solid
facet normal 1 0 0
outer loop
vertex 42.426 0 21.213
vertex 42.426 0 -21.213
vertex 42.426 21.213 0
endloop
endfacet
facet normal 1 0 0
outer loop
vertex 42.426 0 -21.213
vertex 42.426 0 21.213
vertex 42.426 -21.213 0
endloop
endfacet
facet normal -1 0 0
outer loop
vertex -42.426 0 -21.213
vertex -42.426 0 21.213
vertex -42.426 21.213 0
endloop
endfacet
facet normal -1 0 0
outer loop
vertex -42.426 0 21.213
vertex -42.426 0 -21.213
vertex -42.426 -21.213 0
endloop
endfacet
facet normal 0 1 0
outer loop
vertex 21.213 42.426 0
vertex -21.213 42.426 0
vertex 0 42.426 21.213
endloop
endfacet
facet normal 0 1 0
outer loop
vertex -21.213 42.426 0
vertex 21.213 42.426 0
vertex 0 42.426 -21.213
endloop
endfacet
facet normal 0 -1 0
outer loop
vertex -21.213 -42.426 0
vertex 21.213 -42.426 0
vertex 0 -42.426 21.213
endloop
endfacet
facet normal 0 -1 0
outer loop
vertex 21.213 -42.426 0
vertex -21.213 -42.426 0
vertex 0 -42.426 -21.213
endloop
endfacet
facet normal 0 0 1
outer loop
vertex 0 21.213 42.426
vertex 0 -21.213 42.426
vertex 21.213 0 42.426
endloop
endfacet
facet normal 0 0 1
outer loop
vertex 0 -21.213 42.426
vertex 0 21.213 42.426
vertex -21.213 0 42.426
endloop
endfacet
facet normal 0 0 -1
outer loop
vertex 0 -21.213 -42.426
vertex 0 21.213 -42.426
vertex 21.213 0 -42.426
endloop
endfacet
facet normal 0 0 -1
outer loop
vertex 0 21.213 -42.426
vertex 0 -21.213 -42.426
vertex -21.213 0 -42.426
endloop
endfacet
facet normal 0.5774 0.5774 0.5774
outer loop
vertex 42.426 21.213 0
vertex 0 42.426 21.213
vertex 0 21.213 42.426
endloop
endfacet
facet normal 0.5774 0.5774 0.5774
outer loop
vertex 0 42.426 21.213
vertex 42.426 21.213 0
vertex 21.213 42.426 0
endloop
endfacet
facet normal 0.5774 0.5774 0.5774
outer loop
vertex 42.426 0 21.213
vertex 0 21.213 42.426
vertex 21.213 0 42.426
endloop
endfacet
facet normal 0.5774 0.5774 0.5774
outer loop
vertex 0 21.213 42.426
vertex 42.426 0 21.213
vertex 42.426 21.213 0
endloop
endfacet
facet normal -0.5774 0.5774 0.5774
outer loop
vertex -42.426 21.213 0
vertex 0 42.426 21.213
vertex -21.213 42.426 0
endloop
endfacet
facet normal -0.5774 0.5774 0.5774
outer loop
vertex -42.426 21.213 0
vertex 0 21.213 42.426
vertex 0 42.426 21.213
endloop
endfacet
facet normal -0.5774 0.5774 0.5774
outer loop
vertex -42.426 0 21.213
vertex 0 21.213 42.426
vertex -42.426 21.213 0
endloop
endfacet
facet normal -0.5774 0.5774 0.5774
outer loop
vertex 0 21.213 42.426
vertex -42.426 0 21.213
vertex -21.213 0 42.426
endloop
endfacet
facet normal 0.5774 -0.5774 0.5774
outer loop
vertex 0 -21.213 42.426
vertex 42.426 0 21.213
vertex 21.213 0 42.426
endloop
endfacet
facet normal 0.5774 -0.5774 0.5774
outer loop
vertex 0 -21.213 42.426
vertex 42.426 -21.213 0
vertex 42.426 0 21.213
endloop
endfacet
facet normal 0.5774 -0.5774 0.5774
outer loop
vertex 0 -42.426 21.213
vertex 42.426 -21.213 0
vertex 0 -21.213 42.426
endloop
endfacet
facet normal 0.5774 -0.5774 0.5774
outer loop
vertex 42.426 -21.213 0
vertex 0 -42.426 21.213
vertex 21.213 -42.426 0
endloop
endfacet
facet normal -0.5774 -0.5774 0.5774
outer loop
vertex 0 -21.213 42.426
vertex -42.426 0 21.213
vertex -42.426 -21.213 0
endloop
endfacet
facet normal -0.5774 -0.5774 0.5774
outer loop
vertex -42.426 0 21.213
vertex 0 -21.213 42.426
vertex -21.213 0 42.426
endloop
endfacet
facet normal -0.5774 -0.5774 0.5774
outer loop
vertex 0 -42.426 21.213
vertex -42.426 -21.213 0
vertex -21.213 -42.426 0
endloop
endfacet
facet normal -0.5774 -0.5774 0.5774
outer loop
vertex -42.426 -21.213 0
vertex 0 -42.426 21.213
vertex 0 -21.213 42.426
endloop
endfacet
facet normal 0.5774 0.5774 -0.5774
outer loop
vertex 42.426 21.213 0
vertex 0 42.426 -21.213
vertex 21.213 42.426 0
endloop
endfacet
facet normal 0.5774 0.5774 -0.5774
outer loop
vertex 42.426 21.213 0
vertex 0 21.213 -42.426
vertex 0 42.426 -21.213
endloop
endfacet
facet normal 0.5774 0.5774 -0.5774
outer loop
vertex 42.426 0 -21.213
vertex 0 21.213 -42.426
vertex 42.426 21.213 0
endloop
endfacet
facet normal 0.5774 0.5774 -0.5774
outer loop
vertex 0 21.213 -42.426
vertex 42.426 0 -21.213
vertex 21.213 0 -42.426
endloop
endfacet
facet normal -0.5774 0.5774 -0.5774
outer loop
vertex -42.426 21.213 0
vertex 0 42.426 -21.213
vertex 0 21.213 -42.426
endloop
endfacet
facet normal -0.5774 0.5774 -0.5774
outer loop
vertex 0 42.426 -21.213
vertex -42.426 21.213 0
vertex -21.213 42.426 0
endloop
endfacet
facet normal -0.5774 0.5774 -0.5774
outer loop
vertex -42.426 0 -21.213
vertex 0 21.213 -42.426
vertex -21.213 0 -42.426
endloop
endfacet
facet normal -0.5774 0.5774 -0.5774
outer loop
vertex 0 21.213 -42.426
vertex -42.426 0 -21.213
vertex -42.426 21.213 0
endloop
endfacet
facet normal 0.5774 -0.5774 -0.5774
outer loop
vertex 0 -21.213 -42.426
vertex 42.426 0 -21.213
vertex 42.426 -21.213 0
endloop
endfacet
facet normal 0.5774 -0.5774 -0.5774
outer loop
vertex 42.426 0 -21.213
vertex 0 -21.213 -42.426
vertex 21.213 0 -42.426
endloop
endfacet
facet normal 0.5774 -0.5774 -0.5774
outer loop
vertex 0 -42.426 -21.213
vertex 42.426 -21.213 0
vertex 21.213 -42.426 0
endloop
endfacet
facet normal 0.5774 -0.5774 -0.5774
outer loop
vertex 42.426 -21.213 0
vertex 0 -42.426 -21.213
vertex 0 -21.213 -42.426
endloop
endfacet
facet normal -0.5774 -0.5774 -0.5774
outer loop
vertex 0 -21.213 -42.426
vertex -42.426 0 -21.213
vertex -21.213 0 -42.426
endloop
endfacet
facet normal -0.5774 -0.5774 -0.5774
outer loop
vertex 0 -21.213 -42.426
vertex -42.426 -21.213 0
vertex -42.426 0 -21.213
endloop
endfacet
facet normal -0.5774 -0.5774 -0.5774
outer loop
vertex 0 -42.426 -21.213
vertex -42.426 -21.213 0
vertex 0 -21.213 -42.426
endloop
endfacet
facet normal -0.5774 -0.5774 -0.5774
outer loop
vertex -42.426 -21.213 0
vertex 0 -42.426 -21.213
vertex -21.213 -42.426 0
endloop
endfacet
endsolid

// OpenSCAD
// Truncated Octahedron
// (C) @oblomobka - 2023.06
// GPL license

/* **CUSTOMIZER VARIABLES** */
// Edge
edge = 30; // [10:100]
// Center of the solid or stand over a face
position = "Center"; // ["Center", "Face"]

/* **MODULES** */   
module TruncatedOctahedron ( edge = 30, position = "Face"){ //tO / bT -> Conway notation
    
    // Invariants
    
    // Relations
    
    // Variables
    a = 3*edge/sqrt(2);
    b = edge/sqrt(2); //b represent the truncation value to obtain regular polygons. It operates on the vertex of the original(Platonic) polyhedron.
    
    // Definition of points and faces V = 24 / F = 14 ( 6 squares + 8 hexagons )
    tOpoints = [
        // Every line build the vertices of a square, tha is the truncation on the octahedron vertices
        [ +(a-b), +b, 0], [ +(a-b), -b, 0], [ +(a-b), 0, +b], [ +(a-b), 0, -b], // +X   [  0,  1,  2,  3]
        [ +b, +(a-b), 0], [ -b, +(a-b), 0], [ 0, +(a-b), +b], [ 0, +(a-b), -b], // +Y   [  4,  5,  6,  7]
        [ +b, 0, +(a-b)], [ -b, 0, +(a-b)], [ 0, +b, +(a-b)], [ 0, -b, +(a-b)], // +Z   [  8,  9, 10, 11]
        [ -(a-b), +b, 0], [ -(a-b), -b, 0], [ -(a-b), 0, +b], [ -(a-b), 0, -b], // -X   [ 12, 13, 14, 15]
        [ +b, -(a-b), 0], [ -b, -(a-b), 0], [ 0, -(a-b), +b], [ 0, -(a-b), -b], // -Y   [ 16, 17, 18, 18]
        [ +b, 0, -(a-b)], [ -b, 0, -(a-b)], [ 0, +b, -(a-b)], [ 0, -b, -(a-b)]  // -Z   [ 20, 21, 22, 23]
        ];
    
    tOfaces = [
        // Squares
        [  0,  3,  1,  2], [ 12, 14, 13, 15],                   // parallel YZ
        [  4,  6,  5,  7], [ 16, 19, 17, 18],                   // parallel XZ
        [  8, 11,  9, 10], [ 21, 23, 20, 22],                   // parallel XY
        // Build 8 hexagons. One hexagon per octant
        [  0,  2,  8, 10,  6,  4], [  5,  6, 10,  9, 14, 12],   // UP
        [  1, 16, 18, 11,  8,  2], [  9, 11, 18, 17, 13, 14],   // UP
        [  0,  4,  7, 22, 20,  3], [  5, 12, 15, 21, 22,  7],   // DOWN
        [  1,  3, 20, 23, 19, 16], [ 13, 17, 19, 23, 21, 15]    // DOWN
        ];
  
    // Polyhedron stands on xy plane centered on the center of the face or centered on the center of polyhedron
    if ( position == "Center"){
        polyhedron ( tOpoints, tOfaces);
        }
    else if ( position == "Face"){
        translate ([ 0, 0, edge*sqrt(2)])
            polyhedron ( tOpoints, tOfaces);
        }
    }

/* **RENDERING OF SOLIDS** */
TruncatedOctahedron ( edge = edge, position = position);
